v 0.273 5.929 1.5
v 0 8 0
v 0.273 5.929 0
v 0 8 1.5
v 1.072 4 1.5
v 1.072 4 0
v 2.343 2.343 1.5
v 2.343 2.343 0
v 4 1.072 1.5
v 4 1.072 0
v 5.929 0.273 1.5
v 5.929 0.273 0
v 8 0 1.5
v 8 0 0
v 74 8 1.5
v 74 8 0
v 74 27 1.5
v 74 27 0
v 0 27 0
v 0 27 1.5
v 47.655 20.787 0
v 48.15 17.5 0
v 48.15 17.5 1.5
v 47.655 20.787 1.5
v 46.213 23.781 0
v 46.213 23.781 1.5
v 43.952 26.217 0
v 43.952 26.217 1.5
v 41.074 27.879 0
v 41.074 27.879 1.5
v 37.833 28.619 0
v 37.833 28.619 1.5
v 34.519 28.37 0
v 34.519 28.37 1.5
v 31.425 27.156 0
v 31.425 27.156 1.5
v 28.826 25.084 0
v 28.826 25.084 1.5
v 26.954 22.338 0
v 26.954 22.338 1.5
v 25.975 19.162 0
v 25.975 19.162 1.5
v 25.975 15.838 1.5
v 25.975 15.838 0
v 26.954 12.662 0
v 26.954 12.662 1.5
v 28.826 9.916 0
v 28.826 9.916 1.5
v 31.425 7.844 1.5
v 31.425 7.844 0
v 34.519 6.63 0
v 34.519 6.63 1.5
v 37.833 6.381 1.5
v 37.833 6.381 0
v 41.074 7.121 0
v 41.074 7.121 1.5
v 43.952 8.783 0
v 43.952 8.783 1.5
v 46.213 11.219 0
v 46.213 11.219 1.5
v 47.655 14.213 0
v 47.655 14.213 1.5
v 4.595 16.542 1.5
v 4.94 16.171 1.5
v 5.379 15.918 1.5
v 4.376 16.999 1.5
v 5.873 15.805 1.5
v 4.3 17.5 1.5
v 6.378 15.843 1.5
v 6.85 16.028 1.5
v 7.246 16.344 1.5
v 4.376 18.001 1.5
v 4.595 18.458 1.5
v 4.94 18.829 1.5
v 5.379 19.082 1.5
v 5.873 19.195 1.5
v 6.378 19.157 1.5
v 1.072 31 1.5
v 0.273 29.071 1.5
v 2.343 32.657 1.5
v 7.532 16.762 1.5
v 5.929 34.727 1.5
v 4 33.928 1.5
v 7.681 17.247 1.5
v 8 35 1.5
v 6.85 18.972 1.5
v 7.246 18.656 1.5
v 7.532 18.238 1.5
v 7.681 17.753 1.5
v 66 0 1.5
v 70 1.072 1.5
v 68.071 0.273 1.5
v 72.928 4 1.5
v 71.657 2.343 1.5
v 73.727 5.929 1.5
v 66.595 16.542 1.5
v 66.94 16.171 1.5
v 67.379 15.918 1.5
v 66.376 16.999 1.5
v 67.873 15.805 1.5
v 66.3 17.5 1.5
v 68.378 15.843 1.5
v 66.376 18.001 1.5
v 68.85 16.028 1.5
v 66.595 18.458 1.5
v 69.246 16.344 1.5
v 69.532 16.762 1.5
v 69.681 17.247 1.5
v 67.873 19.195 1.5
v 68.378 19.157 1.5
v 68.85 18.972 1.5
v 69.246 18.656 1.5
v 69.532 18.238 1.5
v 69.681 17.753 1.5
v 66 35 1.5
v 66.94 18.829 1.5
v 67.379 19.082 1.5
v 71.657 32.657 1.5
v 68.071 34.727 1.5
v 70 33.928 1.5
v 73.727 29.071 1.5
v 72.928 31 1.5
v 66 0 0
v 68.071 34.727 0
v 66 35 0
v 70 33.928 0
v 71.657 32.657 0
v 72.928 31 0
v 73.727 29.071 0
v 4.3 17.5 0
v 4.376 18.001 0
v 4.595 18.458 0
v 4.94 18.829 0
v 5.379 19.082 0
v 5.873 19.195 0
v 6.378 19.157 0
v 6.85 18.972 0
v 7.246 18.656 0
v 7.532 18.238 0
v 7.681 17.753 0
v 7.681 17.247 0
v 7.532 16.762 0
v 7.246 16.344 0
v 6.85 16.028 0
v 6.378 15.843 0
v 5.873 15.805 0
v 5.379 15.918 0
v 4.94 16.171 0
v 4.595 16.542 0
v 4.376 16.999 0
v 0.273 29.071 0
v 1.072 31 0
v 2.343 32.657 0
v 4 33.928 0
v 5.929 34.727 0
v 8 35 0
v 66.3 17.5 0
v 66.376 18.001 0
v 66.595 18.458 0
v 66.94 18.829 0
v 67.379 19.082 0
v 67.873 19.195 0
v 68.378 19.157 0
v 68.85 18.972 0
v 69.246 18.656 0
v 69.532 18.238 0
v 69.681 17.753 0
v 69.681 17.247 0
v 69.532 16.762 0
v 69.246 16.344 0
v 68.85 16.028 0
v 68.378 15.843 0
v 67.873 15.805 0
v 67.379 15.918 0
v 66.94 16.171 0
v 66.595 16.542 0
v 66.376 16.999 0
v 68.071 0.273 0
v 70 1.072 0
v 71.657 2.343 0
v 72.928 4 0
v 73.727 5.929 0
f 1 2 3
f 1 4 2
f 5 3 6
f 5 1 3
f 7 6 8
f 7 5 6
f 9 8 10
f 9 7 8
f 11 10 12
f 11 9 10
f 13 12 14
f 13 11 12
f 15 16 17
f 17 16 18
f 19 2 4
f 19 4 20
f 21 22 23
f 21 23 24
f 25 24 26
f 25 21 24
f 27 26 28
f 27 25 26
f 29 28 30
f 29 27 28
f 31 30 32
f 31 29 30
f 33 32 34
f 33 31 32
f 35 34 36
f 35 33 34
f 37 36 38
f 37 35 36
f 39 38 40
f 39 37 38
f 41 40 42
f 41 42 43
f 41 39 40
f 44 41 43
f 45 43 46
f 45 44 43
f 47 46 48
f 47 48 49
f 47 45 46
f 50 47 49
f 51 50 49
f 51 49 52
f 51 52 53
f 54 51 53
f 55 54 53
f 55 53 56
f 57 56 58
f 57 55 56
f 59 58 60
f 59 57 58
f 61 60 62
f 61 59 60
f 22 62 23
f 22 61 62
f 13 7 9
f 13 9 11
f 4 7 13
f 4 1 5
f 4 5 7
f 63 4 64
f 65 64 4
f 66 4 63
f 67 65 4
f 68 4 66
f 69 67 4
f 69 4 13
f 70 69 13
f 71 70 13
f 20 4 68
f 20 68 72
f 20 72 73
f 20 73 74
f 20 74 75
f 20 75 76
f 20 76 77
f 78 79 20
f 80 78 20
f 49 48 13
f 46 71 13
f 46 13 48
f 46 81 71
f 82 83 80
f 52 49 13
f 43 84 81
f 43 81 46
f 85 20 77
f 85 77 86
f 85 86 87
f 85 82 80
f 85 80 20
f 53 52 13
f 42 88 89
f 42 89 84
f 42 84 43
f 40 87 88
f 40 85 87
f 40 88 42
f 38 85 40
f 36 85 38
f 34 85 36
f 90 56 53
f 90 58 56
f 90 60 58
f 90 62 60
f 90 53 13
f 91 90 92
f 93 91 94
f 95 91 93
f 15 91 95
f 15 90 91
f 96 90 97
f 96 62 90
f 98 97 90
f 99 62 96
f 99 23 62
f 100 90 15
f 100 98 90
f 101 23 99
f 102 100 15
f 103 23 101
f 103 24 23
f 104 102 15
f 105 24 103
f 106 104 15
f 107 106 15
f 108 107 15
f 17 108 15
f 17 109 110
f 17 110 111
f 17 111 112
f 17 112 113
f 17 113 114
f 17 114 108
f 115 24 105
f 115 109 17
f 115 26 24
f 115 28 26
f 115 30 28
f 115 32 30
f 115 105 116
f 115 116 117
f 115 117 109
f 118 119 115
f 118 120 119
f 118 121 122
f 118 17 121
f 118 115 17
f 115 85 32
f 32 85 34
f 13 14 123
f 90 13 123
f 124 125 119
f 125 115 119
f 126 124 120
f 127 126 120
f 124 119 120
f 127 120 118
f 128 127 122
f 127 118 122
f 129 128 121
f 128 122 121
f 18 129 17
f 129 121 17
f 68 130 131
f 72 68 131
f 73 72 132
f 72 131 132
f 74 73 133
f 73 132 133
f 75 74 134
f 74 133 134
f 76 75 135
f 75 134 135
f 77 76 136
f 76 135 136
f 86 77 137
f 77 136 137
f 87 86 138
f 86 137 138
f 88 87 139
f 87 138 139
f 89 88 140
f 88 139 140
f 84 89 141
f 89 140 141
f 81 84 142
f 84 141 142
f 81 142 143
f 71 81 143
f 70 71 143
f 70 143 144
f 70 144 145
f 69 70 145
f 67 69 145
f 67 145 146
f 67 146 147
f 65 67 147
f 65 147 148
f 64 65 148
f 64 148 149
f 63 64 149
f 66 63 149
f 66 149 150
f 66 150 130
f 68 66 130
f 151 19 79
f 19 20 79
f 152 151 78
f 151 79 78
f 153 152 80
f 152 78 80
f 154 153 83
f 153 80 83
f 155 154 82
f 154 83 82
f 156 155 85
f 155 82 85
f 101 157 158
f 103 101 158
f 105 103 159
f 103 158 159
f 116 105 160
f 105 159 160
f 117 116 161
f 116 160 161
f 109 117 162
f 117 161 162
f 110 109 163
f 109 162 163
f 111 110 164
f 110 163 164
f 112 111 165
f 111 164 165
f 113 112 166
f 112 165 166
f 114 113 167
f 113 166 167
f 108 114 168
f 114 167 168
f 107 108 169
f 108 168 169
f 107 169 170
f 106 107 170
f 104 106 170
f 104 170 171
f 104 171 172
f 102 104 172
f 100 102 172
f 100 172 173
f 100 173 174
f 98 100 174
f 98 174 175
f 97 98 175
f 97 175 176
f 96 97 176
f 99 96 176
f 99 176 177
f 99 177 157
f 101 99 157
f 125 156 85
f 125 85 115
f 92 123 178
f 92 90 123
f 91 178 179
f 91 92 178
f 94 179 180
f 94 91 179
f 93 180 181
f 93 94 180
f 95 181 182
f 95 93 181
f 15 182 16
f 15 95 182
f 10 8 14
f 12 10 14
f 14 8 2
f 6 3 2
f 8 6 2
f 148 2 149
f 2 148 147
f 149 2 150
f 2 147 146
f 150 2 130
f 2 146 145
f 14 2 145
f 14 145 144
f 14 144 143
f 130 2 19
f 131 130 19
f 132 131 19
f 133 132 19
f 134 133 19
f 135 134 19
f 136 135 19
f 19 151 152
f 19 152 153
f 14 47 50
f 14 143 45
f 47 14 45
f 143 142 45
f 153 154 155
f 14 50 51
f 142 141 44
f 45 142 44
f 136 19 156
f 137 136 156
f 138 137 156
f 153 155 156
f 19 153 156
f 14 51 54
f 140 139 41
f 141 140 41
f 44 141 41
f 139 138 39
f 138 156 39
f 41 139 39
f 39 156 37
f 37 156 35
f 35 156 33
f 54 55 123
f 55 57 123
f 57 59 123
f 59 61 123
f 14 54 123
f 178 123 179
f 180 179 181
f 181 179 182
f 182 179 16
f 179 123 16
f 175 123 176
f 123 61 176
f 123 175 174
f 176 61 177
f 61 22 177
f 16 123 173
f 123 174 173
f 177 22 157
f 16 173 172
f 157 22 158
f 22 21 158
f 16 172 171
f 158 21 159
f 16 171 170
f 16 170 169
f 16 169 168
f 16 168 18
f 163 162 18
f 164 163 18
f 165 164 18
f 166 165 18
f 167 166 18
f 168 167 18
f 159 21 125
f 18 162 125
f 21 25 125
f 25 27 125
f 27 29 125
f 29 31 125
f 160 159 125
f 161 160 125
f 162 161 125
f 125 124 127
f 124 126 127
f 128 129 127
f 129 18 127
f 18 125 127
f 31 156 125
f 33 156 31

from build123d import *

# Parameters (mm, degrees)
ESQUISSE1_W          = 74
ESQUISSE1_H          = 35
ESQUISSE1_R          = 11.15
ESQUISSE1_R_2        = 1.5
BOSS_EXTRU_1_DEPTH   = 1.5
D_GAGEMENT_M31_D     = 3.4
D_GAGEMENT_M31_DEPTH = 1.5
CONG_1_R             = 8


with BuildPart() as part:
    # Esquisse1 → Boss.-Extru.1 (new body)
    with BuildSketch(Plane.XY):
        with Locations((37, 17.5)):
            Rectangle(ESQUISSE1_W, ESQUISSE1_H)
        with Locations((37, 17.5)):
            Circle(ESQUISSE1_R, mode=Mode.SUBTRACT)
        with Locations((6, 17.5)):
            Circle(ESQUISSE1_R_2, mode=Mode.SUBTRACT)
        with Locations((68, 17.5)):
            Circle(ESQUISSE1_R_2, mode=Mode.SUBTRACT)
    extrude(amount=BOSS_EXTRU_1_DEPTH)

    # Dégagement M31
    with Locations(Plane.XY.offset(1.5)):
        with Locations((6, 17.5), (68, 17.5)):
            Hole(D_GAGEMENT_M31_D / 2, depth=D_GAGEMENT_M31_DEPTH)

    # Congé1
    cong_1_edges = [part.edges().sort_by_distance(p)[0] for p in [
        (0, 35, 0.75),
        (74, 35, 0.75),
        (74, 0, 0.75),
        (0, 0, 0.75),
    ]]
    fillet(cong_1_edges, radius=CONG_1_R)


solid = part.part
